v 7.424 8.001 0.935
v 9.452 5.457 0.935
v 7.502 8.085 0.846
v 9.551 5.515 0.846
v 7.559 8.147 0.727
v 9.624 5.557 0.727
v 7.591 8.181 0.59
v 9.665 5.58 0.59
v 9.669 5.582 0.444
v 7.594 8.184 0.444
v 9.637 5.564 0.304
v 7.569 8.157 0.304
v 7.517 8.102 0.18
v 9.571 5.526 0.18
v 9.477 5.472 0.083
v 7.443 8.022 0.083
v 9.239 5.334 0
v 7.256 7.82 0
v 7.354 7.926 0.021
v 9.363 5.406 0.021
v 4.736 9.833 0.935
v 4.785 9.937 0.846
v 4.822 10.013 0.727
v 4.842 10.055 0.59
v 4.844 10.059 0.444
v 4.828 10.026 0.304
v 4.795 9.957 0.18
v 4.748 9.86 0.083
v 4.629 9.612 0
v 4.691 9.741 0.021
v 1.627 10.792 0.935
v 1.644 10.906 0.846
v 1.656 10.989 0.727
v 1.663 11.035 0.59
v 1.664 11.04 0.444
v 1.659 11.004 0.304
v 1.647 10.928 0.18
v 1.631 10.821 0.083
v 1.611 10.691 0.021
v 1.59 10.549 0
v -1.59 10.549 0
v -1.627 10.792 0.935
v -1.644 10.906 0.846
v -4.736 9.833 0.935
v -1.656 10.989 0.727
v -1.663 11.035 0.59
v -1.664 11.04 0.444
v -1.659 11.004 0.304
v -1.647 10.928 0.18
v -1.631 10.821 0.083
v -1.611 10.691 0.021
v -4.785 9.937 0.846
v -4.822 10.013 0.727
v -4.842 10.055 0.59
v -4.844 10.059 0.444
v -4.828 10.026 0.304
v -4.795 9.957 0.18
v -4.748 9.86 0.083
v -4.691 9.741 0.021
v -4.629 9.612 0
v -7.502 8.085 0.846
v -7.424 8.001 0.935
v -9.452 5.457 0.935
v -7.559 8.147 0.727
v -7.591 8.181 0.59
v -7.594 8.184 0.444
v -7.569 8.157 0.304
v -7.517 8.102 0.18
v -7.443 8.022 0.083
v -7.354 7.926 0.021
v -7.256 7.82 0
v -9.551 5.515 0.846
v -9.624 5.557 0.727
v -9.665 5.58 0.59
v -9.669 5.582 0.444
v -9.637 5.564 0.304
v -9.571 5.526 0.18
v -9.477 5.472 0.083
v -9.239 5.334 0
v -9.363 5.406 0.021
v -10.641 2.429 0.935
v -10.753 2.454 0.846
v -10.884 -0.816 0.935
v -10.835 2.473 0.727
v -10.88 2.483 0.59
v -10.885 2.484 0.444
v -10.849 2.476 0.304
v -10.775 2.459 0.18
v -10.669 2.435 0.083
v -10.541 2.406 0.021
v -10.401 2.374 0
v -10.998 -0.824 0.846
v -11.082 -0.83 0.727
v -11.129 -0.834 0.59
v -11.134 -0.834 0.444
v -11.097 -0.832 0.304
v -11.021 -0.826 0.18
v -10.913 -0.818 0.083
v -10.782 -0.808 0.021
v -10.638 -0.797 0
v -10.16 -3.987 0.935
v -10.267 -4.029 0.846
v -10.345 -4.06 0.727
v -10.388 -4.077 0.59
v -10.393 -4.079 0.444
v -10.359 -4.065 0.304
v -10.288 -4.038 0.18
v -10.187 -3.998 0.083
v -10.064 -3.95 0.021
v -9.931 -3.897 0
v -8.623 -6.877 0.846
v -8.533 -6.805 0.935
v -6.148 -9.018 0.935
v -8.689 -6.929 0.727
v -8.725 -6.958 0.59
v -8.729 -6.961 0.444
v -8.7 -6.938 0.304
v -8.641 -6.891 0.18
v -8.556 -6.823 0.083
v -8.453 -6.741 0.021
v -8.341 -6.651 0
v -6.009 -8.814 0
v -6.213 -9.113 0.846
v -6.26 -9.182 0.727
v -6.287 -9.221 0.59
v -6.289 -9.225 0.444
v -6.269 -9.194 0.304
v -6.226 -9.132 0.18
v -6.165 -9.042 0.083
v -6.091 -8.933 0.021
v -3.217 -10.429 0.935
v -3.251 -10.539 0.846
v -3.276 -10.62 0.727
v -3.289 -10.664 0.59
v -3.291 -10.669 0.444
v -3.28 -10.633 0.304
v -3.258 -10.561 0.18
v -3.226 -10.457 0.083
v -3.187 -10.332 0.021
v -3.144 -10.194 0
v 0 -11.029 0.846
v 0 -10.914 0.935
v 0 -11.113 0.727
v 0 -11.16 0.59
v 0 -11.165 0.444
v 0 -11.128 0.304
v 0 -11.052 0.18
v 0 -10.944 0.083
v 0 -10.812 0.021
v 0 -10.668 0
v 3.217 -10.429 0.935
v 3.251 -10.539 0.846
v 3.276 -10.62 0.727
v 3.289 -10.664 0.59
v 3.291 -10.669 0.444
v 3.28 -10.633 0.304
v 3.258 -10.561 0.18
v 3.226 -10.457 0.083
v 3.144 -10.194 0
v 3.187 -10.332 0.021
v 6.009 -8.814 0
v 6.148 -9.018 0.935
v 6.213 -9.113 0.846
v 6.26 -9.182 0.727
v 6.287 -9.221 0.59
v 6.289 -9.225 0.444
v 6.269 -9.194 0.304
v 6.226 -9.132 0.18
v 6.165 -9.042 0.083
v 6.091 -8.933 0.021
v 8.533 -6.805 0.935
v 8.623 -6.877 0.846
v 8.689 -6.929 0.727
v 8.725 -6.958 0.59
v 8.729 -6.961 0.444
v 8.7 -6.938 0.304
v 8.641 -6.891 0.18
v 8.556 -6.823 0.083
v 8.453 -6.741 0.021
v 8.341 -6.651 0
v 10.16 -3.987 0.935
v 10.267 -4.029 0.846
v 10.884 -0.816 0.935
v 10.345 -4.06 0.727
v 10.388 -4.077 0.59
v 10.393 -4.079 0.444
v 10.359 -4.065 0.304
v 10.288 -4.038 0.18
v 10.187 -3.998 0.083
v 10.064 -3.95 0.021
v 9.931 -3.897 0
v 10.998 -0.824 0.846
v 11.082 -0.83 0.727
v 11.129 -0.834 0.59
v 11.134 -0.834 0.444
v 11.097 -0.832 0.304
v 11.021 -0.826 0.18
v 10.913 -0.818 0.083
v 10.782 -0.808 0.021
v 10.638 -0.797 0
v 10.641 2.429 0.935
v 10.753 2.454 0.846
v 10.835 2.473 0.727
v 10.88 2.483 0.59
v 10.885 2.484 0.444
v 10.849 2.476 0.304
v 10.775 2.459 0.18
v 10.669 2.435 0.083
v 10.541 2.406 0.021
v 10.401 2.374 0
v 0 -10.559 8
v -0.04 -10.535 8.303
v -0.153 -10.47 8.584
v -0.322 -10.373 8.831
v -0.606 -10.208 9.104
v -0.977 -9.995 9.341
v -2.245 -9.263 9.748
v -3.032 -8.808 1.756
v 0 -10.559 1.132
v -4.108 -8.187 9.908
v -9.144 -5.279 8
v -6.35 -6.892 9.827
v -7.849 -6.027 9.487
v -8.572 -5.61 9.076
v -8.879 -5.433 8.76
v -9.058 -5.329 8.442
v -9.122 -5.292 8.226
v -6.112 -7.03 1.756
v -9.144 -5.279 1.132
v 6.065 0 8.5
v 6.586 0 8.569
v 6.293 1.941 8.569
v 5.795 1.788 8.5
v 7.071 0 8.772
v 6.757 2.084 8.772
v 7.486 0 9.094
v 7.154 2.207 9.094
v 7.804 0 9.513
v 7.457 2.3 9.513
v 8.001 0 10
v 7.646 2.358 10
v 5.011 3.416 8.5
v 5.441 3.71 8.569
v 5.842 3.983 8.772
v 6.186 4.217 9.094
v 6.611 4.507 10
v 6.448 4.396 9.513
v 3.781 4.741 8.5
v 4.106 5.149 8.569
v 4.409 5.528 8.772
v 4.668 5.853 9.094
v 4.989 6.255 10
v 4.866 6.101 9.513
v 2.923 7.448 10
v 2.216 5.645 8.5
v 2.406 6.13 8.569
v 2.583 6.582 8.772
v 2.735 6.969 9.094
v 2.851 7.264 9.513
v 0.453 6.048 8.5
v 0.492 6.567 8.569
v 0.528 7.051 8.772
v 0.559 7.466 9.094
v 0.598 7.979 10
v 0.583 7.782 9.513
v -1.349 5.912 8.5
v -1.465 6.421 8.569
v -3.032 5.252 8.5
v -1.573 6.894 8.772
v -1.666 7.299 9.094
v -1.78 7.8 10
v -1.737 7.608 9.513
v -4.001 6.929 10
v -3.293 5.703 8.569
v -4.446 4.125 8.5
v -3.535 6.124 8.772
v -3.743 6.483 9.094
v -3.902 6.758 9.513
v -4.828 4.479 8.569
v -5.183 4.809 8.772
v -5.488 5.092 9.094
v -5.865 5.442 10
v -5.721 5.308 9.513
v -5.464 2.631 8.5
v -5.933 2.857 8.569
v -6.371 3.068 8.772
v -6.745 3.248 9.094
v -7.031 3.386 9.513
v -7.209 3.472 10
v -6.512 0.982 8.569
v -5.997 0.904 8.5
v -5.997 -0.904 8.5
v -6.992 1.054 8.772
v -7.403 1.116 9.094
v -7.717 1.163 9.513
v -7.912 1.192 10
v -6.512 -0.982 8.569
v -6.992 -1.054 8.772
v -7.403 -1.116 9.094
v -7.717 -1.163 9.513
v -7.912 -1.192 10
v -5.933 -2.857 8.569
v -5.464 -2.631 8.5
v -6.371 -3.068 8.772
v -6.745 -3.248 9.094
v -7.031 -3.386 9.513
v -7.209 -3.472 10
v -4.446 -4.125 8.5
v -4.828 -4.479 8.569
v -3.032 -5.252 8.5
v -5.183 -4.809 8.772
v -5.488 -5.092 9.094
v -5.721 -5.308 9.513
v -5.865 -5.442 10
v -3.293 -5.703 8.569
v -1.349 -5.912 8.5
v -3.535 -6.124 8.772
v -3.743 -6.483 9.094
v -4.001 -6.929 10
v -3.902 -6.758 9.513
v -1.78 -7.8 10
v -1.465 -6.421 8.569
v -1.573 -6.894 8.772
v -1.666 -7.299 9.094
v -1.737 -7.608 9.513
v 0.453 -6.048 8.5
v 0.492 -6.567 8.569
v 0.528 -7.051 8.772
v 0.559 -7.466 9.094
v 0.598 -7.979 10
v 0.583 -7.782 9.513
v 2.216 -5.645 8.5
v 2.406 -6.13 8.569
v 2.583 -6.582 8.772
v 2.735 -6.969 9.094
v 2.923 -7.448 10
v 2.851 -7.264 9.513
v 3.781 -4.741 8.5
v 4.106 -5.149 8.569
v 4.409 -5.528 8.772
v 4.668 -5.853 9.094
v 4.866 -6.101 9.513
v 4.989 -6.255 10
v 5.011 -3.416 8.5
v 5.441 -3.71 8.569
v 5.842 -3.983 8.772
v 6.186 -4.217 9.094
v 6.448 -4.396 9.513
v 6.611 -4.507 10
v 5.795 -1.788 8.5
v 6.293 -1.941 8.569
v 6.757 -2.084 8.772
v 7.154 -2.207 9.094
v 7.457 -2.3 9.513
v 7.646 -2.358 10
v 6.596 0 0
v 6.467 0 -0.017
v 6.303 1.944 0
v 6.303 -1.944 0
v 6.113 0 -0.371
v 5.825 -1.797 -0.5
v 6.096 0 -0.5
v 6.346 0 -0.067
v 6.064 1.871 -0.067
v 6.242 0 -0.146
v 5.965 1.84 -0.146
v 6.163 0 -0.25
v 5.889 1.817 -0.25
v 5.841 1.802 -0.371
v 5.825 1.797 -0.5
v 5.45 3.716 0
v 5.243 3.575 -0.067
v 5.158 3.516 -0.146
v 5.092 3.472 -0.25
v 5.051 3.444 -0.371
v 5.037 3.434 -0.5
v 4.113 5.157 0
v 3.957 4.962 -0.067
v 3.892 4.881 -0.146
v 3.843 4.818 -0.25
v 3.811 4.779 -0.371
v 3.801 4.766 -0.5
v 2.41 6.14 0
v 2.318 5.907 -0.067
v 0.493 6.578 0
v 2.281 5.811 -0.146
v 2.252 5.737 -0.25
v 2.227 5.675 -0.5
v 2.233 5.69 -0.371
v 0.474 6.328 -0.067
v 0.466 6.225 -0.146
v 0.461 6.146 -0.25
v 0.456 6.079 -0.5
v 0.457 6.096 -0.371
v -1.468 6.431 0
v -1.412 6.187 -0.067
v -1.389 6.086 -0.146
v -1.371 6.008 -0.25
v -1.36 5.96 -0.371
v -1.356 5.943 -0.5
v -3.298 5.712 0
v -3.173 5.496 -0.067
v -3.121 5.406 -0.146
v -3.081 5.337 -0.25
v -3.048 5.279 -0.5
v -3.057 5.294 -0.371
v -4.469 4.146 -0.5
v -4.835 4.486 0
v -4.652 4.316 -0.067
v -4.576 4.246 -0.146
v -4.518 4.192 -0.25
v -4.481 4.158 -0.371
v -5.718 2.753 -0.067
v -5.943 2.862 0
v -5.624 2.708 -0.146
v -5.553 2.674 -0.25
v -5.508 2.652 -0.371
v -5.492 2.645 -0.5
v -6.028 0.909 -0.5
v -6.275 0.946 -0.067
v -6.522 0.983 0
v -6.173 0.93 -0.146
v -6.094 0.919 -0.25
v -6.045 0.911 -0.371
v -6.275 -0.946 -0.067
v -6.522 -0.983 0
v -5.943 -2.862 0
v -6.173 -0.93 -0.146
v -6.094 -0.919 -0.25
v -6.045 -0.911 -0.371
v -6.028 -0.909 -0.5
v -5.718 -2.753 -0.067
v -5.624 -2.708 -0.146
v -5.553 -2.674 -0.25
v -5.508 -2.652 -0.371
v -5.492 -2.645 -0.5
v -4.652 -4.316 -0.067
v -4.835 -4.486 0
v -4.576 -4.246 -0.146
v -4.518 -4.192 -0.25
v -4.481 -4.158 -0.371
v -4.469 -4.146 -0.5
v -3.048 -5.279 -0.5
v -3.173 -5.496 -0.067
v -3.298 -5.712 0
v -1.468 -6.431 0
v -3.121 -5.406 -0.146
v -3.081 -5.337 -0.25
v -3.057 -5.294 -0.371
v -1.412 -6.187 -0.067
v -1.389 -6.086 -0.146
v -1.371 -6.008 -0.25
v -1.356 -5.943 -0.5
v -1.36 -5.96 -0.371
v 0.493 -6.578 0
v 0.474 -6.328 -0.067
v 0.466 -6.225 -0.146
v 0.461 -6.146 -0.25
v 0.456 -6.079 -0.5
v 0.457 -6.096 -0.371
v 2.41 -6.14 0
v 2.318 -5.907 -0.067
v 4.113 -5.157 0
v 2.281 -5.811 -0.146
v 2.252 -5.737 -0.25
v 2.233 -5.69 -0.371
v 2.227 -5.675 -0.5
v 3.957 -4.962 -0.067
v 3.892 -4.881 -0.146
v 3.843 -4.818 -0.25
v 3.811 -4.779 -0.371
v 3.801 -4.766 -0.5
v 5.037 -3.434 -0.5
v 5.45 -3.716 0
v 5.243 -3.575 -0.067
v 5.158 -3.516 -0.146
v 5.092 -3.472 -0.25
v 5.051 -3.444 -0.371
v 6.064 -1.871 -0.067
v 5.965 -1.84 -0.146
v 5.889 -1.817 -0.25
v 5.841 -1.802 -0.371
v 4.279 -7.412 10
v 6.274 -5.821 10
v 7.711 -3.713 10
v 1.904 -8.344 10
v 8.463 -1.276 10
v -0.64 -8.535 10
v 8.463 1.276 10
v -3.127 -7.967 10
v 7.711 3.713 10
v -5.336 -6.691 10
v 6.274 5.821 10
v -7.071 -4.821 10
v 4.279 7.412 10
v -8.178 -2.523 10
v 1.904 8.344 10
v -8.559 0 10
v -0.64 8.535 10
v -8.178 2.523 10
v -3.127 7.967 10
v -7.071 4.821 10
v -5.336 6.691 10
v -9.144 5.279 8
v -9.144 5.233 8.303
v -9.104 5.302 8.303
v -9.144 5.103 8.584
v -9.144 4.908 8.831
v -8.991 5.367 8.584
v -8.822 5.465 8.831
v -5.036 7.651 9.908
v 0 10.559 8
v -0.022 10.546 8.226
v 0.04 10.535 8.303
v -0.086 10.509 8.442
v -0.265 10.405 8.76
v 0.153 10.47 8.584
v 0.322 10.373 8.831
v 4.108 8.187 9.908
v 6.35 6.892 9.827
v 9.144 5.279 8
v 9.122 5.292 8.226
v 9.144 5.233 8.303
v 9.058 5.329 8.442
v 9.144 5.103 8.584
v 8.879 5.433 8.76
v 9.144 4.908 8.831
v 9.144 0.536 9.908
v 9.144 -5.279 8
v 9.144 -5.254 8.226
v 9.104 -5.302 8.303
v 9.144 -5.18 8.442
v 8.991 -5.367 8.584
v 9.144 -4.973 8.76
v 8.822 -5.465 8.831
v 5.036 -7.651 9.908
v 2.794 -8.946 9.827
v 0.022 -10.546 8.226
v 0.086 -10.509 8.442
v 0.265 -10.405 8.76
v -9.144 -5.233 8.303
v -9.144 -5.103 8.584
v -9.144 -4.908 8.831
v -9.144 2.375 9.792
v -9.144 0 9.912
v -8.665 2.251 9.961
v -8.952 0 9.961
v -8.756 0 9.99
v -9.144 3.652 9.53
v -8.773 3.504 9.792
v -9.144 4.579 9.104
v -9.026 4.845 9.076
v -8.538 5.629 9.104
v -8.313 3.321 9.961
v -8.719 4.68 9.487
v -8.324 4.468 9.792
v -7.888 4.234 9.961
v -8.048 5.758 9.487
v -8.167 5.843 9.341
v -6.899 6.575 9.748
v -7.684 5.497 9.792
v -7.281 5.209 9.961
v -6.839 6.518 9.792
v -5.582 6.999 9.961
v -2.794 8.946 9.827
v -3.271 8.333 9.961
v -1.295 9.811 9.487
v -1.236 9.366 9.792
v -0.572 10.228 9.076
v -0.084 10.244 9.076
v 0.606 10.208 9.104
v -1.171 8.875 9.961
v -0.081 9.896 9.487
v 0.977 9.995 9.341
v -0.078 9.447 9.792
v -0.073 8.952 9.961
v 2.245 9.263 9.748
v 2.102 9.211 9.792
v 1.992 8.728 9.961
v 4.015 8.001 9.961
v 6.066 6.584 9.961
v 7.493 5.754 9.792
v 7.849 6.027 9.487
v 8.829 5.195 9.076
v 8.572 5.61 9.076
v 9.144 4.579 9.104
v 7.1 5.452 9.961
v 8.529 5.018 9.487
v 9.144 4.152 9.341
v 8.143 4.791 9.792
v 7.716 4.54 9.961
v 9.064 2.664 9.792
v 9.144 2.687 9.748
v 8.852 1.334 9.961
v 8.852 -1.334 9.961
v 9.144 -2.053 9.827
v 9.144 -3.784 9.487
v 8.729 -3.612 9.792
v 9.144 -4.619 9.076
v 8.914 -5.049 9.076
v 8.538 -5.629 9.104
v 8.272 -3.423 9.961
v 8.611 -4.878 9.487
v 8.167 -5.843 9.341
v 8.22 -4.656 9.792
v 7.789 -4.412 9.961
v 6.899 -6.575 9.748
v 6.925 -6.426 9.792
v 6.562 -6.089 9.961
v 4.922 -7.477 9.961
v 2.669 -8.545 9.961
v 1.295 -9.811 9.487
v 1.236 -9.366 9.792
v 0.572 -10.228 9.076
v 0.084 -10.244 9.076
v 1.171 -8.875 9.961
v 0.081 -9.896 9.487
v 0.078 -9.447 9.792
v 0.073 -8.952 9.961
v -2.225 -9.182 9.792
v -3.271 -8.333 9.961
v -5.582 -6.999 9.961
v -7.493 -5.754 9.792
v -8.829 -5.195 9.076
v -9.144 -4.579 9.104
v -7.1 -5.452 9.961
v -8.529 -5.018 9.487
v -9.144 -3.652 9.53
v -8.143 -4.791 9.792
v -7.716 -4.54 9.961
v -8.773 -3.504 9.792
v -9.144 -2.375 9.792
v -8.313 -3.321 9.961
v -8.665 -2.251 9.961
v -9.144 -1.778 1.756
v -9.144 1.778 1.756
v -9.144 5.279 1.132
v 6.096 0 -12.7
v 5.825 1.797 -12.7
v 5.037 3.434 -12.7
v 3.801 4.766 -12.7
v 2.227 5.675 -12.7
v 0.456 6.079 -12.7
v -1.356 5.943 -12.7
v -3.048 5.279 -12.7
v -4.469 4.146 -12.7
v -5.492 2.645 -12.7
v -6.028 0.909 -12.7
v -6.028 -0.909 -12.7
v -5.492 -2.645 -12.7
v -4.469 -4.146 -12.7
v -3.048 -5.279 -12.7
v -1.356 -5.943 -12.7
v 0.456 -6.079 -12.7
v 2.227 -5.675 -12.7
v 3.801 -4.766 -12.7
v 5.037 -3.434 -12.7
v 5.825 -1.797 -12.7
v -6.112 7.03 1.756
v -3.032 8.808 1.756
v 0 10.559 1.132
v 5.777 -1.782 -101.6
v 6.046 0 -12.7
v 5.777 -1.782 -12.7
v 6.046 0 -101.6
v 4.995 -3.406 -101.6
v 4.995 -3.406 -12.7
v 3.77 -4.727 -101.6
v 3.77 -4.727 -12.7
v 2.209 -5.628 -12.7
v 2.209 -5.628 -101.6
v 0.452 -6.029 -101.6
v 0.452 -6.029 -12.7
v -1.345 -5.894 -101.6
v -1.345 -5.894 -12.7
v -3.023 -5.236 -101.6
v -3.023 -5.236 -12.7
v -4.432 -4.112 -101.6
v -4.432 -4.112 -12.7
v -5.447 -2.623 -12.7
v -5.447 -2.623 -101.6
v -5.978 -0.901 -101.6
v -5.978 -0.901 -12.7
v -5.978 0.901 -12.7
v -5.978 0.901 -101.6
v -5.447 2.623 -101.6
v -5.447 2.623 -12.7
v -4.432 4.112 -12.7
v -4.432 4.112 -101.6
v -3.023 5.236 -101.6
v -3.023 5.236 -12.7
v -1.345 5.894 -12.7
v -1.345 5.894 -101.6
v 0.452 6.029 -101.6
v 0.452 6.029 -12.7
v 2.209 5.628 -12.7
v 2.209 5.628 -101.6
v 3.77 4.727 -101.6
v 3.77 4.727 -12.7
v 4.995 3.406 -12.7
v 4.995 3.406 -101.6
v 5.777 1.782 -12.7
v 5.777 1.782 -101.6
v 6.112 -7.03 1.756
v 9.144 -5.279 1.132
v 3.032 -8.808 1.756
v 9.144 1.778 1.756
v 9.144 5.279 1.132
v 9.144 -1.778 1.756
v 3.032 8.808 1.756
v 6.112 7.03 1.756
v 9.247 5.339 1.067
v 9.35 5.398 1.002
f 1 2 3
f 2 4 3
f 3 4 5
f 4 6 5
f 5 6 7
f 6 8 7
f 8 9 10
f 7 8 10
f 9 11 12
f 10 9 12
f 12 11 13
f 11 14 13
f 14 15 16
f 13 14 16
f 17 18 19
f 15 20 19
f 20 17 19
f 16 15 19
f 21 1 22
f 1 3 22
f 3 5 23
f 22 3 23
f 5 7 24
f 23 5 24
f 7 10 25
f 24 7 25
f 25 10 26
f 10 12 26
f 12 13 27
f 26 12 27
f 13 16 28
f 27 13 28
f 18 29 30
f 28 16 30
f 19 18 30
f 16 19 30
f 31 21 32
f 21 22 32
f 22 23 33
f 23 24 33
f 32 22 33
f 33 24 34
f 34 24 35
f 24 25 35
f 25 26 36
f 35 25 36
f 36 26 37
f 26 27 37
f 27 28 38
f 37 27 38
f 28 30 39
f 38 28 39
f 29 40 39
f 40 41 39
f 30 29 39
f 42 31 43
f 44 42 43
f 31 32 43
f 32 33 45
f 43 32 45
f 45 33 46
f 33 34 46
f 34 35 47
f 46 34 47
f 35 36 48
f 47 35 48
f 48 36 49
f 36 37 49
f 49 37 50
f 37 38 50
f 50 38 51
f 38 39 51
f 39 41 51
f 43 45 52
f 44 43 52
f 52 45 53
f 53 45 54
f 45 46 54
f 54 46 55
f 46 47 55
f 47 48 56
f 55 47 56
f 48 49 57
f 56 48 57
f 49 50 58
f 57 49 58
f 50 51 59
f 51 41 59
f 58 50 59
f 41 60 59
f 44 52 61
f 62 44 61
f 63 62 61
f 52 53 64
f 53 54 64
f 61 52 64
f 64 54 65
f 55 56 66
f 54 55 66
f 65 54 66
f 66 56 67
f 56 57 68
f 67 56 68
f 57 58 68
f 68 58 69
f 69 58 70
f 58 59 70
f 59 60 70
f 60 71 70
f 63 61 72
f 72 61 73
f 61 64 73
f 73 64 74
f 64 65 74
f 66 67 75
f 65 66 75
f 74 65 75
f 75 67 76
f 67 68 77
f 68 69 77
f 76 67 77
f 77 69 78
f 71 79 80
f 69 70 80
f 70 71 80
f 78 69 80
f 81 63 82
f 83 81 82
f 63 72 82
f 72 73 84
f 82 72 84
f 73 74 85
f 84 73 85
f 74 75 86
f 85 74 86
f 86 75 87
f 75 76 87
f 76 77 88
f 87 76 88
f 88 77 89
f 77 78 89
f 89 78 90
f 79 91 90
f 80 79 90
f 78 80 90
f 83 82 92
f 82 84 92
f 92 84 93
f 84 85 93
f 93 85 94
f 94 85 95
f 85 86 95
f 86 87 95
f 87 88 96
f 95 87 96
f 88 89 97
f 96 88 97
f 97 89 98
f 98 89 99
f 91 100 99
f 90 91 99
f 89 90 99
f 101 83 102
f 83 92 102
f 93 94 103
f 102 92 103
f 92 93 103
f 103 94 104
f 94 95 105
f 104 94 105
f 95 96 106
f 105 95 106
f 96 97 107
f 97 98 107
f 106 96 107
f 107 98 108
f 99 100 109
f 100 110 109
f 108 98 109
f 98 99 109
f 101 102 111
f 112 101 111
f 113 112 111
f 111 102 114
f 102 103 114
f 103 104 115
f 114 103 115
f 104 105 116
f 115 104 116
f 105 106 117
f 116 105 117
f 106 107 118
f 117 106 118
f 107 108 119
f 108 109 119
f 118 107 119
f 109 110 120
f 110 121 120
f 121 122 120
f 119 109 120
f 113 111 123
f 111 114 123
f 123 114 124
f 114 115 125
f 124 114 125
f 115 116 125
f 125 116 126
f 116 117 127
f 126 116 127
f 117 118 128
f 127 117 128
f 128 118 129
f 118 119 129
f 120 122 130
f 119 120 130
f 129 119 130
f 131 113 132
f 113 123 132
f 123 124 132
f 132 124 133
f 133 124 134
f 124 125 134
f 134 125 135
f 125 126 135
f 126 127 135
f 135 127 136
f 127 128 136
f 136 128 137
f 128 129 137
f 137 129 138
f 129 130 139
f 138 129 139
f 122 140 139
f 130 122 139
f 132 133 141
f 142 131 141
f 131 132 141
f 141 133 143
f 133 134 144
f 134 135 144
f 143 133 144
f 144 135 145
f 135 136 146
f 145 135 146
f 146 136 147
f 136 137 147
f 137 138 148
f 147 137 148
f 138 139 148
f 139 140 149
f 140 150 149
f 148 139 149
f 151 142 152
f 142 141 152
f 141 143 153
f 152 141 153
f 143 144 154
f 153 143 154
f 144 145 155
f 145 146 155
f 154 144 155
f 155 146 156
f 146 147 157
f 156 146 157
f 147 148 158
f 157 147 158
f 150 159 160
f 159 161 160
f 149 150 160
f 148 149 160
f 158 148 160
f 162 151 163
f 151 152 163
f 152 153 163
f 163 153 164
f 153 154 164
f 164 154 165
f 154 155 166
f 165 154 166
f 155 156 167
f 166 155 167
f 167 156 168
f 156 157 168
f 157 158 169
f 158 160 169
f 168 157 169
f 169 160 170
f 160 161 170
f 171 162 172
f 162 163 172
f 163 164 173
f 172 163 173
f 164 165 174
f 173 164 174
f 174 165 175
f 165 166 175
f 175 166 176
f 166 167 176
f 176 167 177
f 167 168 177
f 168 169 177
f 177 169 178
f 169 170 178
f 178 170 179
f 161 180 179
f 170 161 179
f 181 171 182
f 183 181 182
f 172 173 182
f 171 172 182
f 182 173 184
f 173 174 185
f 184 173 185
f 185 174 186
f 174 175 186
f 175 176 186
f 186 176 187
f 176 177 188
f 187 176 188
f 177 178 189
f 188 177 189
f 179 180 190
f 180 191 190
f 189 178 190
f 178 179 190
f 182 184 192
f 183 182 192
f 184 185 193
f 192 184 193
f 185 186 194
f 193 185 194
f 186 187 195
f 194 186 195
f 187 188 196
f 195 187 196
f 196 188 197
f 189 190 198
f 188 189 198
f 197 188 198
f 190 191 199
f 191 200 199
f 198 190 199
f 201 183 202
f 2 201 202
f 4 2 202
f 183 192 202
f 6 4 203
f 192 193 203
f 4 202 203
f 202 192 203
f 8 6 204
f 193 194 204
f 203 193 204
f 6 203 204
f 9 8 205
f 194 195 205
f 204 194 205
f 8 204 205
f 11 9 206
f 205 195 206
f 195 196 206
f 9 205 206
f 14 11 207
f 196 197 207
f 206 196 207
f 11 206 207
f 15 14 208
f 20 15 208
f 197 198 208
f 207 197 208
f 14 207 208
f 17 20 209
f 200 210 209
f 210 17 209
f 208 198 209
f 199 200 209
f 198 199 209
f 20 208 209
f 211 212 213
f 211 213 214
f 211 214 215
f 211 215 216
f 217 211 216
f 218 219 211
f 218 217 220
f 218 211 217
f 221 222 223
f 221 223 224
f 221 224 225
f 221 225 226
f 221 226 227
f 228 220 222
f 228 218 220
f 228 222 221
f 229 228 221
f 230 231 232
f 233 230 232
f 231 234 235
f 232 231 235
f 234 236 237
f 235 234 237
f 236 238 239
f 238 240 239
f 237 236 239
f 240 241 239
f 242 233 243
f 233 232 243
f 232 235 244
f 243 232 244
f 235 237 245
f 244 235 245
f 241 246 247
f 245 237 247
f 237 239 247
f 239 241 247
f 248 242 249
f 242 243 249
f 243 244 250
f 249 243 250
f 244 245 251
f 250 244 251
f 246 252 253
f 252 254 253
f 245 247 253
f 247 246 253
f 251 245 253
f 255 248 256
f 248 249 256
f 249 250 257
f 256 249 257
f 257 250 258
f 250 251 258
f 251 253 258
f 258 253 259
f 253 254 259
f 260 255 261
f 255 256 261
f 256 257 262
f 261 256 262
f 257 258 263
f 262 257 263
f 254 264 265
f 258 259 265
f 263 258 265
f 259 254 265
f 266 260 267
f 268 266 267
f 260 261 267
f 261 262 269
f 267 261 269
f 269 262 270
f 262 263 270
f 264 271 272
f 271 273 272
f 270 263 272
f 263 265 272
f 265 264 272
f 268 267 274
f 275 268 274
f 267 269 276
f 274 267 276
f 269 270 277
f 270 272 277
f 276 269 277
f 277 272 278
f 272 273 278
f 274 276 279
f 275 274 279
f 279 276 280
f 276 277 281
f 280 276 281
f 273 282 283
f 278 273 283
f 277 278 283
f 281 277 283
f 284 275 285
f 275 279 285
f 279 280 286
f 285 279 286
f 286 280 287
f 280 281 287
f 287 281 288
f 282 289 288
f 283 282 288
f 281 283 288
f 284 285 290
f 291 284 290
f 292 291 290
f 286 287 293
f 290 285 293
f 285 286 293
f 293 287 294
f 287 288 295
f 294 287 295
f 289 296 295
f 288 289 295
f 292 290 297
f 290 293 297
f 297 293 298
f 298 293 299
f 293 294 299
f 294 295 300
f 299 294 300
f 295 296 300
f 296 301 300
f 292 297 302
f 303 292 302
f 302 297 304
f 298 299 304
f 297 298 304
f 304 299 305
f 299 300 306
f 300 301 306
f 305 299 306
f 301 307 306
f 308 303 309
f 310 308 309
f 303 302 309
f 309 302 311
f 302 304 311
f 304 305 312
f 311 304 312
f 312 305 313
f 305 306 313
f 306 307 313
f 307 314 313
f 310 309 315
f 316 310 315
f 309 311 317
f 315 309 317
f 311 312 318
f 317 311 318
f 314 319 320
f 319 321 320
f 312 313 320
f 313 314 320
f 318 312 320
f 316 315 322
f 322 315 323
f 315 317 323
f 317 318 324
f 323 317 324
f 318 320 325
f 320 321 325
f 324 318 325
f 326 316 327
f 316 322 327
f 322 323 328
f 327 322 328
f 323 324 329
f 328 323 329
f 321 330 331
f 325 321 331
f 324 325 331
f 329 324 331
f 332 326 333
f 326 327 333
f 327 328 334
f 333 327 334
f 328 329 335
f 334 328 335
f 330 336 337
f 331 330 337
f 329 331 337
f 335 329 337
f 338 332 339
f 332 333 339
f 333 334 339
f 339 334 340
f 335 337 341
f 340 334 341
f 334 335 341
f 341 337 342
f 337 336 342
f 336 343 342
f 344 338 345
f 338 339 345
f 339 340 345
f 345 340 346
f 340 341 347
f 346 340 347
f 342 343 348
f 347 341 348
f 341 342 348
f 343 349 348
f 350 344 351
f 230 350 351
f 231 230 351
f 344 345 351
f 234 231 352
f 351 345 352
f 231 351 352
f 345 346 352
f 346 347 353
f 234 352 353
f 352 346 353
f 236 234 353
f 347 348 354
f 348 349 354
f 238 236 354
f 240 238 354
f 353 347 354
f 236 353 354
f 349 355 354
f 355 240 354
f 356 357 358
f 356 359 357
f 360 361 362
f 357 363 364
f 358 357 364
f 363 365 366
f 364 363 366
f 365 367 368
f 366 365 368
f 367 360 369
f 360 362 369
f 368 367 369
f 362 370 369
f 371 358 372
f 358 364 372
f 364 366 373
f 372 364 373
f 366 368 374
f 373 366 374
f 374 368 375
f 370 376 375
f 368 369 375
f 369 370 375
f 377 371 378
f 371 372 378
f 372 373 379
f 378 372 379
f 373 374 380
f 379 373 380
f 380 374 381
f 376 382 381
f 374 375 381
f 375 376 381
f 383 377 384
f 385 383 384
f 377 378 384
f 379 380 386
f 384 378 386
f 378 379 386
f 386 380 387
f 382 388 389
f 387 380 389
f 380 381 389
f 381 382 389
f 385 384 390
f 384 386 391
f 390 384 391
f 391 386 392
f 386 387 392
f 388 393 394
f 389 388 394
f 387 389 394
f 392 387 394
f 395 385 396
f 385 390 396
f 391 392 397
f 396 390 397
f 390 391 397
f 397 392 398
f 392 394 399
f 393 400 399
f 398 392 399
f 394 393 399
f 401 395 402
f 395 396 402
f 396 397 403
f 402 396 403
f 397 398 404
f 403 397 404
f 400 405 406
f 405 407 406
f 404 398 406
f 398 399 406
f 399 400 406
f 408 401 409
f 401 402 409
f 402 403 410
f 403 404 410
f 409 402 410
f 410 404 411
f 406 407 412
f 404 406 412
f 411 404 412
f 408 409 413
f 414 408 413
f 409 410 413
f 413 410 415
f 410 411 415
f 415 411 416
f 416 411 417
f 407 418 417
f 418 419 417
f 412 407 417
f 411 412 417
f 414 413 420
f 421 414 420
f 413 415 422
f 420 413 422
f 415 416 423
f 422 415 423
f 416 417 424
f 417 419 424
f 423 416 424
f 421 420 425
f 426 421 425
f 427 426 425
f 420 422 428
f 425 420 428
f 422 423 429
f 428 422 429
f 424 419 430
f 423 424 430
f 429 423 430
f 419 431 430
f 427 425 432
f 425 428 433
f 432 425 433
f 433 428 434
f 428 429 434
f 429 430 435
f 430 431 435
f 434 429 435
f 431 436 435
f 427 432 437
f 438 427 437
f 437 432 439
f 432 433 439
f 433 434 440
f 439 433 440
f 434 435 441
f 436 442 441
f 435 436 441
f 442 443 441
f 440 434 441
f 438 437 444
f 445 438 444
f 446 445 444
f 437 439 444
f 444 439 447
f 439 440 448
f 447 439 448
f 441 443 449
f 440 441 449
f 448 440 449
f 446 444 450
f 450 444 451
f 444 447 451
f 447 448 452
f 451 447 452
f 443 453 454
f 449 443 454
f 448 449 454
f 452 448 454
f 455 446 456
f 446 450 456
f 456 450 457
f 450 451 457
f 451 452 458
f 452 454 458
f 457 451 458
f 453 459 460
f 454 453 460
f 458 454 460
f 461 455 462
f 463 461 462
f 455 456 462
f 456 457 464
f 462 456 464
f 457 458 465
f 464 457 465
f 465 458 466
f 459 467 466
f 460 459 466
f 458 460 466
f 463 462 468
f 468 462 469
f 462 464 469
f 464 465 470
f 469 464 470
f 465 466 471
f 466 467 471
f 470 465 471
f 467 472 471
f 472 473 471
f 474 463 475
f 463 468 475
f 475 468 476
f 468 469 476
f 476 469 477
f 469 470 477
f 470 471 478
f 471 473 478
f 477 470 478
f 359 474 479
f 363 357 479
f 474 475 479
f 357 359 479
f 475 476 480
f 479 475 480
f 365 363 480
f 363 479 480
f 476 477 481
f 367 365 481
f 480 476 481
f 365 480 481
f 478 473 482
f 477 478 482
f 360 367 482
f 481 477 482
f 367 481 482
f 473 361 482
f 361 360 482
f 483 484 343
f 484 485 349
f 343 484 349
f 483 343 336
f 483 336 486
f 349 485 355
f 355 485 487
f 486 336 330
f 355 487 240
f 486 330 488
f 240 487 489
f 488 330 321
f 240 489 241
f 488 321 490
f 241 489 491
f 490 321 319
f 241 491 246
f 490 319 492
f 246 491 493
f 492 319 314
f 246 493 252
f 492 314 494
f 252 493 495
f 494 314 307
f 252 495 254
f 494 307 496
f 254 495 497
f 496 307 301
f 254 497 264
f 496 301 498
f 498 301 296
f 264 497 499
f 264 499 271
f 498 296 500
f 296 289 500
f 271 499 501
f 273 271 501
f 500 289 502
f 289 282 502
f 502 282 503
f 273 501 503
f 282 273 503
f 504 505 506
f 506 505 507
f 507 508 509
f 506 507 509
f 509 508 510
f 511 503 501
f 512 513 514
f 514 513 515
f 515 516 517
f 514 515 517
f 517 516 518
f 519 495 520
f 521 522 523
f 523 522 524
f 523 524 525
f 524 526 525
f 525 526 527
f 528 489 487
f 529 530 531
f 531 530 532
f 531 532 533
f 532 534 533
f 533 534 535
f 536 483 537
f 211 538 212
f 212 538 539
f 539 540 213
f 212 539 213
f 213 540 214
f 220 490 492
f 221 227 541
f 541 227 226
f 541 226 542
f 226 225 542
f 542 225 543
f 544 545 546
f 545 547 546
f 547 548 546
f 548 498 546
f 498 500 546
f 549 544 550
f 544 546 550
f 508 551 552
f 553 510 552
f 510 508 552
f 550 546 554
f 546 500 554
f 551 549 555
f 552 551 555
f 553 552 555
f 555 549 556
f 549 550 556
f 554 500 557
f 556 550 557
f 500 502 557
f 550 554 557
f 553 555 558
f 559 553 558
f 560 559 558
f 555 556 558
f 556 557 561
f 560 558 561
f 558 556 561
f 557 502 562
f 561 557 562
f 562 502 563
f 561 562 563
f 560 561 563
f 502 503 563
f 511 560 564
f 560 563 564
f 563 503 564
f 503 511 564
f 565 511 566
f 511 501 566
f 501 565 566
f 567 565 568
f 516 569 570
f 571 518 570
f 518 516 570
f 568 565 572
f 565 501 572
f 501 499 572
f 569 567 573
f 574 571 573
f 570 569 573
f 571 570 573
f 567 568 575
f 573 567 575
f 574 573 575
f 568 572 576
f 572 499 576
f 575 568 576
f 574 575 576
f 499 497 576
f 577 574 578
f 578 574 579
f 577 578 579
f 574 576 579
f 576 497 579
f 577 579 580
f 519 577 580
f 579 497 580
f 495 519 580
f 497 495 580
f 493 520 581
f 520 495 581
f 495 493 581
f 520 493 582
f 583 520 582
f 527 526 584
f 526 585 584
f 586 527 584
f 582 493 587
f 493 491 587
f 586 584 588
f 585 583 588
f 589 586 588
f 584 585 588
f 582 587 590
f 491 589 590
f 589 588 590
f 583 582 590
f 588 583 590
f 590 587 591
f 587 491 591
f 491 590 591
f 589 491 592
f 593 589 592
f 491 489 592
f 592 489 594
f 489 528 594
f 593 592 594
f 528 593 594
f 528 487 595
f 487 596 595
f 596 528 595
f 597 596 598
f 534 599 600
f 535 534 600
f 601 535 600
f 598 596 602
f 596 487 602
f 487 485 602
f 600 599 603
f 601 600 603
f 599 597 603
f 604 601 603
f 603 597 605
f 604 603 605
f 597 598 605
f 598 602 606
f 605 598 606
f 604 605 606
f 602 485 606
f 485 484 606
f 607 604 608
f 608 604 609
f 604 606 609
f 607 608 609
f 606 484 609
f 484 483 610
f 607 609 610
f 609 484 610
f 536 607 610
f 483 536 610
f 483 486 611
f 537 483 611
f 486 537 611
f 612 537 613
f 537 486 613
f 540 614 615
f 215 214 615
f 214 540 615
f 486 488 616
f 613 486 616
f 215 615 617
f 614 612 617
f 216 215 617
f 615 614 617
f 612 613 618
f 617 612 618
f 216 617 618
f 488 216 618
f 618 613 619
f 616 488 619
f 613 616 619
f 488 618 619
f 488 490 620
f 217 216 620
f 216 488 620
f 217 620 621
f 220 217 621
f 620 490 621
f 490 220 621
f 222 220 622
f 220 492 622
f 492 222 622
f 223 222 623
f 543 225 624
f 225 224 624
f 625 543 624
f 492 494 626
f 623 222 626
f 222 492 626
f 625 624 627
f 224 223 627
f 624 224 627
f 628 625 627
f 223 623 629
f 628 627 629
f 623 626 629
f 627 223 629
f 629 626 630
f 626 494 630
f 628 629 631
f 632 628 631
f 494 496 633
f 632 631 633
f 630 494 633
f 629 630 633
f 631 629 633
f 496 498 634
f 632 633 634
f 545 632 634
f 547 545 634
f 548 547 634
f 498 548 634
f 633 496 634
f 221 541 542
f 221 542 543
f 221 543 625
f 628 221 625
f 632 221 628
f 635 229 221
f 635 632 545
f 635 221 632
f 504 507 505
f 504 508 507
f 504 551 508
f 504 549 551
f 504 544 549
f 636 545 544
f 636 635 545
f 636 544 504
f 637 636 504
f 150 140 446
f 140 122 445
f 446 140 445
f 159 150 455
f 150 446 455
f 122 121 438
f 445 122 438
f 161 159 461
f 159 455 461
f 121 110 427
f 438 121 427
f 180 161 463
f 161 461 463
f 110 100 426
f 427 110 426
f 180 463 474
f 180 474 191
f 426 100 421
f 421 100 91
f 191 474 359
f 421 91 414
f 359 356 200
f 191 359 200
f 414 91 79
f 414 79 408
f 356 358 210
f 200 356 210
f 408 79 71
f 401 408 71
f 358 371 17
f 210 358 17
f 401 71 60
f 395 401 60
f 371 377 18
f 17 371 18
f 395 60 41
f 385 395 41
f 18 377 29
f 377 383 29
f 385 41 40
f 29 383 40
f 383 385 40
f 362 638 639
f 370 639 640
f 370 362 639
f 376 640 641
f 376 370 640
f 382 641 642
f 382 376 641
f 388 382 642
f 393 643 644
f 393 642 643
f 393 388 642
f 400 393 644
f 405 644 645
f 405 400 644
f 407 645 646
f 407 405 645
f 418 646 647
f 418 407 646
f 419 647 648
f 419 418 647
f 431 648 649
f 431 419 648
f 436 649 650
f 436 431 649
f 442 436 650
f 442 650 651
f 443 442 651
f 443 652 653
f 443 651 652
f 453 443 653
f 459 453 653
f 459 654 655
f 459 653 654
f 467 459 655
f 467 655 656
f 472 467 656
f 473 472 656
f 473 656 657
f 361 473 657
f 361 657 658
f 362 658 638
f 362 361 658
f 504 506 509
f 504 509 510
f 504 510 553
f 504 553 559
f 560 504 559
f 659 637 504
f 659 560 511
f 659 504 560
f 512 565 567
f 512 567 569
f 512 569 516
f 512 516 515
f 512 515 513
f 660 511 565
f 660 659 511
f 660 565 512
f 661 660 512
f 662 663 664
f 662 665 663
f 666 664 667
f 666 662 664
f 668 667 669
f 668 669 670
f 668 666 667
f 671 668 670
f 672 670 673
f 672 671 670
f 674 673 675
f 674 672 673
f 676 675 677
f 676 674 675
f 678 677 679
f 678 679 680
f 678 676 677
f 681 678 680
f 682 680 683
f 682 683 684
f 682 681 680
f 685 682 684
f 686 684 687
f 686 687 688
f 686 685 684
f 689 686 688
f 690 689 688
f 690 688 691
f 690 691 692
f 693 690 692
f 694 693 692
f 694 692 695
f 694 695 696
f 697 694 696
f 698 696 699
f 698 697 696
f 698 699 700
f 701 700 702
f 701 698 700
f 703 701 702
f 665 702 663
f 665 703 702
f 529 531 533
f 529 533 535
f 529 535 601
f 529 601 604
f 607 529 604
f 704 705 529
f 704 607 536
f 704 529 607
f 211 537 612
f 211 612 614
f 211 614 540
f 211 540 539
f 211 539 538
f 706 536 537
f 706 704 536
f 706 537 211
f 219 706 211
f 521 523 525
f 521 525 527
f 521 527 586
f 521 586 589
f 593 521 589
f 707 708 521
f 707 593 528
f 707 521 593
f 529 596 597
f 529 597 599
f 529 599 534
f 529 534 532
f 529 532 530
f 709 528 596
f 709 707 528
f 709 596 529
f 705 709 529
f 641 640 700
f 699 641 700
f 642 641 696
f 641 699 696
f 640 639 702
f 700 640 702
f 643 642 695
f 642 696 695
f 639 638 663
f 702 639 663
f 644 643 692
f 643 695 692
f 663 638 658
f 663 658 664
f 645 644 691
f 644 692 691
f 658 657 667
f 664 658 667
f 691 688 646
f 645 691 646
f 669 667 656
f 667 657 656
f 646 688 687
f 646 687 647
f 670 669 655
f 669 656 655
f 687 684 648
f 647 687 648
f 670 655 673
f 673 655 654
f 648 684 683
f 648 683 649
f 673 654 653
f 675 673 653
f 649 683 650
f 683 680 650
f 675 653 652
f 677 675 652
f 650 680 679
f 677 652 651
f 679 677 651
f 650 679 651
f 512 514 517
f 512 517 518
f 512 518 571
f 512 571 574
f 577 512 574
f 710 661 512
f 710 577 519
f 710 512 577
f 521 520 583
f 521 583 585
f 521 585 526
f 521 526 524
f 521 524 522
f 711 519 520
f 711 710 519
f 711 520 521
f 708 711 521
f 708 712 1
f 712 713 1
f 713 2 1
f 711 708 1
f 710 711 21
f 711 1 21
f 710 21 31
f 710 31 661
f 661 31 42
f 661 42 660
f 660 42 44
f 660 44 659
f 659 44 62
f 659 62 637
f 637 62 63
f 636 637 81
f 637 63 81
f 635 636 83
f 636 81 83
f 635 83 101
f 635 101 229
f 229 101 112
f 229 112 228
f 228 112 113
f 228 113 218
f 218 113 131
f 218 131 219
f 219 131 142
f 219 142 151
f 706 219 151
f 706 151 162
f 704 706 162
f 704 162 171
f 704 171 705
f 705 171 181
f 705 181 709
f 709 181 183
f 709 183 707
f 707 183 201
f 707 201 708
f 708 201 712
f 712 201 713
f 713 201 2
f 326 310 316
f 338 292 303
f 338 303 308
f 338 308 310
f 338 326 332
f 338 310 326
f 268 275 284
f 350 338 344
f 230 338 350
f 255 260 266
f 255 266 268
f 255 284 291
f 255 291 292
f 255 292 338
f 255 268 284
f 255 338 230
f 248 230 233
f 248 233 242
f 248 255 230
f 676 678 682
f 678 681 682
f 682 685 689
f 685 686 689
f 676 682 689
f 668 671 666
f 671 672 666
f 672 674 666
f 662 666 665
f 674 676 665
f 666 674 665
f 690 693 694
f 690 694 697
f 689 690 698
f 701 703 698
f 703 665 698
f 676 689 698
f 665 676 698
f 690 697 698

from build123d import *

# Parameters (mm, degrees)
HEAD_DEPTH     = 10
SHANK_SKETCH_R = 6.096
SHANK_DEPTH    = 101.6
SKETCH6_R      = 8.001
HEAD_CUT_DEPTH = 1.5
FILLET1_R      = 2
FILLET2_R      = 0.5
THREAD_END_W   = 88.9
THREAD_END_H   = 0.05


with BuildPart() as part:
    # Head Sketch → Head (new body)
    with BuildSketch(Plane.XY):
        Polygon((0, 10.558581723), (9.144, 5.279290861), (9.144, -5.279290861), (0, -10.558581723), (-9.144, -5.279290861), (-9.144, 5.279290861), align=None)
    extrude(amount=HEAD_DEPTH)

    # Shank Sketch → Shank (add)
    with BuildSketch(Plane.XY):
        Circle(SHANK_SKETCH_R)
    extrude(amount=-SHANK_DEPTH)

    # Sketch3 → Flange (revolve)
    with BuildSketch(Plane(origin=(0, 0, 0), x_dir=(-1, 0, 0), z_dir=(0, 1, 0)), mode=Mode.PRIVATE) as flange_sk:
        with BuildLine():
            Line((-10.668, 0), (0, 0))
            Line((0, 0), (0, 3.81))
            ThreePointArc((0, 3.81), (-5.643297007, 3.079227926), (-10.91431477, 0.935119563))
            ThreePointArc((-10.91431477, 0.935119563), (-11.151507901, 0.372641807), (-10.668, 0))
        make_face()
    revolve(flange_sk.sketch.rotate(Axis((0, 0, 0), (0, 0, 1)), 30), axis=Axis((0, 0, 0), (0, 0, 1)))

    # Sketch5 → Head Trim (revolve, cut)
    with BuildSketch(Plane(origin=(0, 0, 0), x_dir=(0, 0, -1), z_dir=(1, 0, 0)), mode=Mode.PRIVATE) as head_trim_sk:
        with BuildLine():
            Line((-10, -8.558581723), (-10, -10.558581723))
            Line((-10, -10.558581723), (-8, -10.558581723))
            ThreePointArc((-8, -10.558581723), (-9.414213562, -9.972795285), (-10, -8.558581723))
        make_face()
    revolve(head_trim_sk.sketch.rotate(Axis((0, 0, 15.085599173), (0, 0, -1)), 90), axis=Axis((0, 0, 15.085599173), (0, 0, -1)), mode=Mode.SUBTRACT)

    # Sketch6 → Head Cut (cut)
    with BuildSketch(Plane.XY.offset(10)):
        Circle(SKETCH6_R)
    extrude(amount=-HEAD_CUT_DEPTH, mode=Mode.SUBTRACT)

    # Fillet1
    # the kernel refuses this fillet: 2 mm, written as the material it adds along each edge
    with BuildSketch(Plane(origin=(0, 0, 8.5), x_dir=(1, 0, 0), z_dir=(0, -1, 0))) as fillet1_piece_1:
        with BuildLine():
            CenterArc((6.064508327, 2), FILLET1_R, 270, 75.522487814)
            Line((6.064508327, 0), (6.064508327, -0.04))
            Line((6.064508327, -0.04), (8.001, -0.04))
            Line((8.001, -0.04), (8.041, 0))
            ThreePointArc((8.041, 0), (8.041, 0.75), (8.039729833, 1.49))
            Line((8.039729833, 1.49), (8.001, 1.5))
        make_face()
    revolve(axis=Axis((0, 0, 8.5), (0, 0, 1)))

    # Fillet2
    fillet2_edges = [part.edges().sort_by_distance(p)[0] for p in [
        (-6.096, 0, 0),
    ]]
    fillet(fillet2_edges, radius=FILLET2_R)

    # Thread End → Thread Cut (revolve, cut)
    with BuildSketch(Plane(origin=(0, 0, 0), x_dir=(0, 0, -1), z_dir=(1, 0, 0)), mode=Mode.PRIVATE) as thread_cut_sk:
        with Locations((57.15, 6.071)):
            Rectangle(THREAD_END_W, THREAD_END_H)
    revolve(thread_cut_sk.sketch.rotate(Axis((0, 0, -21.551935625), (0, 0, -1)), 90), axis=Axis((0, 0, -21.551935625), (0, 0, -1)), mode=Mode.SUBTRACT)


solid = part.part
